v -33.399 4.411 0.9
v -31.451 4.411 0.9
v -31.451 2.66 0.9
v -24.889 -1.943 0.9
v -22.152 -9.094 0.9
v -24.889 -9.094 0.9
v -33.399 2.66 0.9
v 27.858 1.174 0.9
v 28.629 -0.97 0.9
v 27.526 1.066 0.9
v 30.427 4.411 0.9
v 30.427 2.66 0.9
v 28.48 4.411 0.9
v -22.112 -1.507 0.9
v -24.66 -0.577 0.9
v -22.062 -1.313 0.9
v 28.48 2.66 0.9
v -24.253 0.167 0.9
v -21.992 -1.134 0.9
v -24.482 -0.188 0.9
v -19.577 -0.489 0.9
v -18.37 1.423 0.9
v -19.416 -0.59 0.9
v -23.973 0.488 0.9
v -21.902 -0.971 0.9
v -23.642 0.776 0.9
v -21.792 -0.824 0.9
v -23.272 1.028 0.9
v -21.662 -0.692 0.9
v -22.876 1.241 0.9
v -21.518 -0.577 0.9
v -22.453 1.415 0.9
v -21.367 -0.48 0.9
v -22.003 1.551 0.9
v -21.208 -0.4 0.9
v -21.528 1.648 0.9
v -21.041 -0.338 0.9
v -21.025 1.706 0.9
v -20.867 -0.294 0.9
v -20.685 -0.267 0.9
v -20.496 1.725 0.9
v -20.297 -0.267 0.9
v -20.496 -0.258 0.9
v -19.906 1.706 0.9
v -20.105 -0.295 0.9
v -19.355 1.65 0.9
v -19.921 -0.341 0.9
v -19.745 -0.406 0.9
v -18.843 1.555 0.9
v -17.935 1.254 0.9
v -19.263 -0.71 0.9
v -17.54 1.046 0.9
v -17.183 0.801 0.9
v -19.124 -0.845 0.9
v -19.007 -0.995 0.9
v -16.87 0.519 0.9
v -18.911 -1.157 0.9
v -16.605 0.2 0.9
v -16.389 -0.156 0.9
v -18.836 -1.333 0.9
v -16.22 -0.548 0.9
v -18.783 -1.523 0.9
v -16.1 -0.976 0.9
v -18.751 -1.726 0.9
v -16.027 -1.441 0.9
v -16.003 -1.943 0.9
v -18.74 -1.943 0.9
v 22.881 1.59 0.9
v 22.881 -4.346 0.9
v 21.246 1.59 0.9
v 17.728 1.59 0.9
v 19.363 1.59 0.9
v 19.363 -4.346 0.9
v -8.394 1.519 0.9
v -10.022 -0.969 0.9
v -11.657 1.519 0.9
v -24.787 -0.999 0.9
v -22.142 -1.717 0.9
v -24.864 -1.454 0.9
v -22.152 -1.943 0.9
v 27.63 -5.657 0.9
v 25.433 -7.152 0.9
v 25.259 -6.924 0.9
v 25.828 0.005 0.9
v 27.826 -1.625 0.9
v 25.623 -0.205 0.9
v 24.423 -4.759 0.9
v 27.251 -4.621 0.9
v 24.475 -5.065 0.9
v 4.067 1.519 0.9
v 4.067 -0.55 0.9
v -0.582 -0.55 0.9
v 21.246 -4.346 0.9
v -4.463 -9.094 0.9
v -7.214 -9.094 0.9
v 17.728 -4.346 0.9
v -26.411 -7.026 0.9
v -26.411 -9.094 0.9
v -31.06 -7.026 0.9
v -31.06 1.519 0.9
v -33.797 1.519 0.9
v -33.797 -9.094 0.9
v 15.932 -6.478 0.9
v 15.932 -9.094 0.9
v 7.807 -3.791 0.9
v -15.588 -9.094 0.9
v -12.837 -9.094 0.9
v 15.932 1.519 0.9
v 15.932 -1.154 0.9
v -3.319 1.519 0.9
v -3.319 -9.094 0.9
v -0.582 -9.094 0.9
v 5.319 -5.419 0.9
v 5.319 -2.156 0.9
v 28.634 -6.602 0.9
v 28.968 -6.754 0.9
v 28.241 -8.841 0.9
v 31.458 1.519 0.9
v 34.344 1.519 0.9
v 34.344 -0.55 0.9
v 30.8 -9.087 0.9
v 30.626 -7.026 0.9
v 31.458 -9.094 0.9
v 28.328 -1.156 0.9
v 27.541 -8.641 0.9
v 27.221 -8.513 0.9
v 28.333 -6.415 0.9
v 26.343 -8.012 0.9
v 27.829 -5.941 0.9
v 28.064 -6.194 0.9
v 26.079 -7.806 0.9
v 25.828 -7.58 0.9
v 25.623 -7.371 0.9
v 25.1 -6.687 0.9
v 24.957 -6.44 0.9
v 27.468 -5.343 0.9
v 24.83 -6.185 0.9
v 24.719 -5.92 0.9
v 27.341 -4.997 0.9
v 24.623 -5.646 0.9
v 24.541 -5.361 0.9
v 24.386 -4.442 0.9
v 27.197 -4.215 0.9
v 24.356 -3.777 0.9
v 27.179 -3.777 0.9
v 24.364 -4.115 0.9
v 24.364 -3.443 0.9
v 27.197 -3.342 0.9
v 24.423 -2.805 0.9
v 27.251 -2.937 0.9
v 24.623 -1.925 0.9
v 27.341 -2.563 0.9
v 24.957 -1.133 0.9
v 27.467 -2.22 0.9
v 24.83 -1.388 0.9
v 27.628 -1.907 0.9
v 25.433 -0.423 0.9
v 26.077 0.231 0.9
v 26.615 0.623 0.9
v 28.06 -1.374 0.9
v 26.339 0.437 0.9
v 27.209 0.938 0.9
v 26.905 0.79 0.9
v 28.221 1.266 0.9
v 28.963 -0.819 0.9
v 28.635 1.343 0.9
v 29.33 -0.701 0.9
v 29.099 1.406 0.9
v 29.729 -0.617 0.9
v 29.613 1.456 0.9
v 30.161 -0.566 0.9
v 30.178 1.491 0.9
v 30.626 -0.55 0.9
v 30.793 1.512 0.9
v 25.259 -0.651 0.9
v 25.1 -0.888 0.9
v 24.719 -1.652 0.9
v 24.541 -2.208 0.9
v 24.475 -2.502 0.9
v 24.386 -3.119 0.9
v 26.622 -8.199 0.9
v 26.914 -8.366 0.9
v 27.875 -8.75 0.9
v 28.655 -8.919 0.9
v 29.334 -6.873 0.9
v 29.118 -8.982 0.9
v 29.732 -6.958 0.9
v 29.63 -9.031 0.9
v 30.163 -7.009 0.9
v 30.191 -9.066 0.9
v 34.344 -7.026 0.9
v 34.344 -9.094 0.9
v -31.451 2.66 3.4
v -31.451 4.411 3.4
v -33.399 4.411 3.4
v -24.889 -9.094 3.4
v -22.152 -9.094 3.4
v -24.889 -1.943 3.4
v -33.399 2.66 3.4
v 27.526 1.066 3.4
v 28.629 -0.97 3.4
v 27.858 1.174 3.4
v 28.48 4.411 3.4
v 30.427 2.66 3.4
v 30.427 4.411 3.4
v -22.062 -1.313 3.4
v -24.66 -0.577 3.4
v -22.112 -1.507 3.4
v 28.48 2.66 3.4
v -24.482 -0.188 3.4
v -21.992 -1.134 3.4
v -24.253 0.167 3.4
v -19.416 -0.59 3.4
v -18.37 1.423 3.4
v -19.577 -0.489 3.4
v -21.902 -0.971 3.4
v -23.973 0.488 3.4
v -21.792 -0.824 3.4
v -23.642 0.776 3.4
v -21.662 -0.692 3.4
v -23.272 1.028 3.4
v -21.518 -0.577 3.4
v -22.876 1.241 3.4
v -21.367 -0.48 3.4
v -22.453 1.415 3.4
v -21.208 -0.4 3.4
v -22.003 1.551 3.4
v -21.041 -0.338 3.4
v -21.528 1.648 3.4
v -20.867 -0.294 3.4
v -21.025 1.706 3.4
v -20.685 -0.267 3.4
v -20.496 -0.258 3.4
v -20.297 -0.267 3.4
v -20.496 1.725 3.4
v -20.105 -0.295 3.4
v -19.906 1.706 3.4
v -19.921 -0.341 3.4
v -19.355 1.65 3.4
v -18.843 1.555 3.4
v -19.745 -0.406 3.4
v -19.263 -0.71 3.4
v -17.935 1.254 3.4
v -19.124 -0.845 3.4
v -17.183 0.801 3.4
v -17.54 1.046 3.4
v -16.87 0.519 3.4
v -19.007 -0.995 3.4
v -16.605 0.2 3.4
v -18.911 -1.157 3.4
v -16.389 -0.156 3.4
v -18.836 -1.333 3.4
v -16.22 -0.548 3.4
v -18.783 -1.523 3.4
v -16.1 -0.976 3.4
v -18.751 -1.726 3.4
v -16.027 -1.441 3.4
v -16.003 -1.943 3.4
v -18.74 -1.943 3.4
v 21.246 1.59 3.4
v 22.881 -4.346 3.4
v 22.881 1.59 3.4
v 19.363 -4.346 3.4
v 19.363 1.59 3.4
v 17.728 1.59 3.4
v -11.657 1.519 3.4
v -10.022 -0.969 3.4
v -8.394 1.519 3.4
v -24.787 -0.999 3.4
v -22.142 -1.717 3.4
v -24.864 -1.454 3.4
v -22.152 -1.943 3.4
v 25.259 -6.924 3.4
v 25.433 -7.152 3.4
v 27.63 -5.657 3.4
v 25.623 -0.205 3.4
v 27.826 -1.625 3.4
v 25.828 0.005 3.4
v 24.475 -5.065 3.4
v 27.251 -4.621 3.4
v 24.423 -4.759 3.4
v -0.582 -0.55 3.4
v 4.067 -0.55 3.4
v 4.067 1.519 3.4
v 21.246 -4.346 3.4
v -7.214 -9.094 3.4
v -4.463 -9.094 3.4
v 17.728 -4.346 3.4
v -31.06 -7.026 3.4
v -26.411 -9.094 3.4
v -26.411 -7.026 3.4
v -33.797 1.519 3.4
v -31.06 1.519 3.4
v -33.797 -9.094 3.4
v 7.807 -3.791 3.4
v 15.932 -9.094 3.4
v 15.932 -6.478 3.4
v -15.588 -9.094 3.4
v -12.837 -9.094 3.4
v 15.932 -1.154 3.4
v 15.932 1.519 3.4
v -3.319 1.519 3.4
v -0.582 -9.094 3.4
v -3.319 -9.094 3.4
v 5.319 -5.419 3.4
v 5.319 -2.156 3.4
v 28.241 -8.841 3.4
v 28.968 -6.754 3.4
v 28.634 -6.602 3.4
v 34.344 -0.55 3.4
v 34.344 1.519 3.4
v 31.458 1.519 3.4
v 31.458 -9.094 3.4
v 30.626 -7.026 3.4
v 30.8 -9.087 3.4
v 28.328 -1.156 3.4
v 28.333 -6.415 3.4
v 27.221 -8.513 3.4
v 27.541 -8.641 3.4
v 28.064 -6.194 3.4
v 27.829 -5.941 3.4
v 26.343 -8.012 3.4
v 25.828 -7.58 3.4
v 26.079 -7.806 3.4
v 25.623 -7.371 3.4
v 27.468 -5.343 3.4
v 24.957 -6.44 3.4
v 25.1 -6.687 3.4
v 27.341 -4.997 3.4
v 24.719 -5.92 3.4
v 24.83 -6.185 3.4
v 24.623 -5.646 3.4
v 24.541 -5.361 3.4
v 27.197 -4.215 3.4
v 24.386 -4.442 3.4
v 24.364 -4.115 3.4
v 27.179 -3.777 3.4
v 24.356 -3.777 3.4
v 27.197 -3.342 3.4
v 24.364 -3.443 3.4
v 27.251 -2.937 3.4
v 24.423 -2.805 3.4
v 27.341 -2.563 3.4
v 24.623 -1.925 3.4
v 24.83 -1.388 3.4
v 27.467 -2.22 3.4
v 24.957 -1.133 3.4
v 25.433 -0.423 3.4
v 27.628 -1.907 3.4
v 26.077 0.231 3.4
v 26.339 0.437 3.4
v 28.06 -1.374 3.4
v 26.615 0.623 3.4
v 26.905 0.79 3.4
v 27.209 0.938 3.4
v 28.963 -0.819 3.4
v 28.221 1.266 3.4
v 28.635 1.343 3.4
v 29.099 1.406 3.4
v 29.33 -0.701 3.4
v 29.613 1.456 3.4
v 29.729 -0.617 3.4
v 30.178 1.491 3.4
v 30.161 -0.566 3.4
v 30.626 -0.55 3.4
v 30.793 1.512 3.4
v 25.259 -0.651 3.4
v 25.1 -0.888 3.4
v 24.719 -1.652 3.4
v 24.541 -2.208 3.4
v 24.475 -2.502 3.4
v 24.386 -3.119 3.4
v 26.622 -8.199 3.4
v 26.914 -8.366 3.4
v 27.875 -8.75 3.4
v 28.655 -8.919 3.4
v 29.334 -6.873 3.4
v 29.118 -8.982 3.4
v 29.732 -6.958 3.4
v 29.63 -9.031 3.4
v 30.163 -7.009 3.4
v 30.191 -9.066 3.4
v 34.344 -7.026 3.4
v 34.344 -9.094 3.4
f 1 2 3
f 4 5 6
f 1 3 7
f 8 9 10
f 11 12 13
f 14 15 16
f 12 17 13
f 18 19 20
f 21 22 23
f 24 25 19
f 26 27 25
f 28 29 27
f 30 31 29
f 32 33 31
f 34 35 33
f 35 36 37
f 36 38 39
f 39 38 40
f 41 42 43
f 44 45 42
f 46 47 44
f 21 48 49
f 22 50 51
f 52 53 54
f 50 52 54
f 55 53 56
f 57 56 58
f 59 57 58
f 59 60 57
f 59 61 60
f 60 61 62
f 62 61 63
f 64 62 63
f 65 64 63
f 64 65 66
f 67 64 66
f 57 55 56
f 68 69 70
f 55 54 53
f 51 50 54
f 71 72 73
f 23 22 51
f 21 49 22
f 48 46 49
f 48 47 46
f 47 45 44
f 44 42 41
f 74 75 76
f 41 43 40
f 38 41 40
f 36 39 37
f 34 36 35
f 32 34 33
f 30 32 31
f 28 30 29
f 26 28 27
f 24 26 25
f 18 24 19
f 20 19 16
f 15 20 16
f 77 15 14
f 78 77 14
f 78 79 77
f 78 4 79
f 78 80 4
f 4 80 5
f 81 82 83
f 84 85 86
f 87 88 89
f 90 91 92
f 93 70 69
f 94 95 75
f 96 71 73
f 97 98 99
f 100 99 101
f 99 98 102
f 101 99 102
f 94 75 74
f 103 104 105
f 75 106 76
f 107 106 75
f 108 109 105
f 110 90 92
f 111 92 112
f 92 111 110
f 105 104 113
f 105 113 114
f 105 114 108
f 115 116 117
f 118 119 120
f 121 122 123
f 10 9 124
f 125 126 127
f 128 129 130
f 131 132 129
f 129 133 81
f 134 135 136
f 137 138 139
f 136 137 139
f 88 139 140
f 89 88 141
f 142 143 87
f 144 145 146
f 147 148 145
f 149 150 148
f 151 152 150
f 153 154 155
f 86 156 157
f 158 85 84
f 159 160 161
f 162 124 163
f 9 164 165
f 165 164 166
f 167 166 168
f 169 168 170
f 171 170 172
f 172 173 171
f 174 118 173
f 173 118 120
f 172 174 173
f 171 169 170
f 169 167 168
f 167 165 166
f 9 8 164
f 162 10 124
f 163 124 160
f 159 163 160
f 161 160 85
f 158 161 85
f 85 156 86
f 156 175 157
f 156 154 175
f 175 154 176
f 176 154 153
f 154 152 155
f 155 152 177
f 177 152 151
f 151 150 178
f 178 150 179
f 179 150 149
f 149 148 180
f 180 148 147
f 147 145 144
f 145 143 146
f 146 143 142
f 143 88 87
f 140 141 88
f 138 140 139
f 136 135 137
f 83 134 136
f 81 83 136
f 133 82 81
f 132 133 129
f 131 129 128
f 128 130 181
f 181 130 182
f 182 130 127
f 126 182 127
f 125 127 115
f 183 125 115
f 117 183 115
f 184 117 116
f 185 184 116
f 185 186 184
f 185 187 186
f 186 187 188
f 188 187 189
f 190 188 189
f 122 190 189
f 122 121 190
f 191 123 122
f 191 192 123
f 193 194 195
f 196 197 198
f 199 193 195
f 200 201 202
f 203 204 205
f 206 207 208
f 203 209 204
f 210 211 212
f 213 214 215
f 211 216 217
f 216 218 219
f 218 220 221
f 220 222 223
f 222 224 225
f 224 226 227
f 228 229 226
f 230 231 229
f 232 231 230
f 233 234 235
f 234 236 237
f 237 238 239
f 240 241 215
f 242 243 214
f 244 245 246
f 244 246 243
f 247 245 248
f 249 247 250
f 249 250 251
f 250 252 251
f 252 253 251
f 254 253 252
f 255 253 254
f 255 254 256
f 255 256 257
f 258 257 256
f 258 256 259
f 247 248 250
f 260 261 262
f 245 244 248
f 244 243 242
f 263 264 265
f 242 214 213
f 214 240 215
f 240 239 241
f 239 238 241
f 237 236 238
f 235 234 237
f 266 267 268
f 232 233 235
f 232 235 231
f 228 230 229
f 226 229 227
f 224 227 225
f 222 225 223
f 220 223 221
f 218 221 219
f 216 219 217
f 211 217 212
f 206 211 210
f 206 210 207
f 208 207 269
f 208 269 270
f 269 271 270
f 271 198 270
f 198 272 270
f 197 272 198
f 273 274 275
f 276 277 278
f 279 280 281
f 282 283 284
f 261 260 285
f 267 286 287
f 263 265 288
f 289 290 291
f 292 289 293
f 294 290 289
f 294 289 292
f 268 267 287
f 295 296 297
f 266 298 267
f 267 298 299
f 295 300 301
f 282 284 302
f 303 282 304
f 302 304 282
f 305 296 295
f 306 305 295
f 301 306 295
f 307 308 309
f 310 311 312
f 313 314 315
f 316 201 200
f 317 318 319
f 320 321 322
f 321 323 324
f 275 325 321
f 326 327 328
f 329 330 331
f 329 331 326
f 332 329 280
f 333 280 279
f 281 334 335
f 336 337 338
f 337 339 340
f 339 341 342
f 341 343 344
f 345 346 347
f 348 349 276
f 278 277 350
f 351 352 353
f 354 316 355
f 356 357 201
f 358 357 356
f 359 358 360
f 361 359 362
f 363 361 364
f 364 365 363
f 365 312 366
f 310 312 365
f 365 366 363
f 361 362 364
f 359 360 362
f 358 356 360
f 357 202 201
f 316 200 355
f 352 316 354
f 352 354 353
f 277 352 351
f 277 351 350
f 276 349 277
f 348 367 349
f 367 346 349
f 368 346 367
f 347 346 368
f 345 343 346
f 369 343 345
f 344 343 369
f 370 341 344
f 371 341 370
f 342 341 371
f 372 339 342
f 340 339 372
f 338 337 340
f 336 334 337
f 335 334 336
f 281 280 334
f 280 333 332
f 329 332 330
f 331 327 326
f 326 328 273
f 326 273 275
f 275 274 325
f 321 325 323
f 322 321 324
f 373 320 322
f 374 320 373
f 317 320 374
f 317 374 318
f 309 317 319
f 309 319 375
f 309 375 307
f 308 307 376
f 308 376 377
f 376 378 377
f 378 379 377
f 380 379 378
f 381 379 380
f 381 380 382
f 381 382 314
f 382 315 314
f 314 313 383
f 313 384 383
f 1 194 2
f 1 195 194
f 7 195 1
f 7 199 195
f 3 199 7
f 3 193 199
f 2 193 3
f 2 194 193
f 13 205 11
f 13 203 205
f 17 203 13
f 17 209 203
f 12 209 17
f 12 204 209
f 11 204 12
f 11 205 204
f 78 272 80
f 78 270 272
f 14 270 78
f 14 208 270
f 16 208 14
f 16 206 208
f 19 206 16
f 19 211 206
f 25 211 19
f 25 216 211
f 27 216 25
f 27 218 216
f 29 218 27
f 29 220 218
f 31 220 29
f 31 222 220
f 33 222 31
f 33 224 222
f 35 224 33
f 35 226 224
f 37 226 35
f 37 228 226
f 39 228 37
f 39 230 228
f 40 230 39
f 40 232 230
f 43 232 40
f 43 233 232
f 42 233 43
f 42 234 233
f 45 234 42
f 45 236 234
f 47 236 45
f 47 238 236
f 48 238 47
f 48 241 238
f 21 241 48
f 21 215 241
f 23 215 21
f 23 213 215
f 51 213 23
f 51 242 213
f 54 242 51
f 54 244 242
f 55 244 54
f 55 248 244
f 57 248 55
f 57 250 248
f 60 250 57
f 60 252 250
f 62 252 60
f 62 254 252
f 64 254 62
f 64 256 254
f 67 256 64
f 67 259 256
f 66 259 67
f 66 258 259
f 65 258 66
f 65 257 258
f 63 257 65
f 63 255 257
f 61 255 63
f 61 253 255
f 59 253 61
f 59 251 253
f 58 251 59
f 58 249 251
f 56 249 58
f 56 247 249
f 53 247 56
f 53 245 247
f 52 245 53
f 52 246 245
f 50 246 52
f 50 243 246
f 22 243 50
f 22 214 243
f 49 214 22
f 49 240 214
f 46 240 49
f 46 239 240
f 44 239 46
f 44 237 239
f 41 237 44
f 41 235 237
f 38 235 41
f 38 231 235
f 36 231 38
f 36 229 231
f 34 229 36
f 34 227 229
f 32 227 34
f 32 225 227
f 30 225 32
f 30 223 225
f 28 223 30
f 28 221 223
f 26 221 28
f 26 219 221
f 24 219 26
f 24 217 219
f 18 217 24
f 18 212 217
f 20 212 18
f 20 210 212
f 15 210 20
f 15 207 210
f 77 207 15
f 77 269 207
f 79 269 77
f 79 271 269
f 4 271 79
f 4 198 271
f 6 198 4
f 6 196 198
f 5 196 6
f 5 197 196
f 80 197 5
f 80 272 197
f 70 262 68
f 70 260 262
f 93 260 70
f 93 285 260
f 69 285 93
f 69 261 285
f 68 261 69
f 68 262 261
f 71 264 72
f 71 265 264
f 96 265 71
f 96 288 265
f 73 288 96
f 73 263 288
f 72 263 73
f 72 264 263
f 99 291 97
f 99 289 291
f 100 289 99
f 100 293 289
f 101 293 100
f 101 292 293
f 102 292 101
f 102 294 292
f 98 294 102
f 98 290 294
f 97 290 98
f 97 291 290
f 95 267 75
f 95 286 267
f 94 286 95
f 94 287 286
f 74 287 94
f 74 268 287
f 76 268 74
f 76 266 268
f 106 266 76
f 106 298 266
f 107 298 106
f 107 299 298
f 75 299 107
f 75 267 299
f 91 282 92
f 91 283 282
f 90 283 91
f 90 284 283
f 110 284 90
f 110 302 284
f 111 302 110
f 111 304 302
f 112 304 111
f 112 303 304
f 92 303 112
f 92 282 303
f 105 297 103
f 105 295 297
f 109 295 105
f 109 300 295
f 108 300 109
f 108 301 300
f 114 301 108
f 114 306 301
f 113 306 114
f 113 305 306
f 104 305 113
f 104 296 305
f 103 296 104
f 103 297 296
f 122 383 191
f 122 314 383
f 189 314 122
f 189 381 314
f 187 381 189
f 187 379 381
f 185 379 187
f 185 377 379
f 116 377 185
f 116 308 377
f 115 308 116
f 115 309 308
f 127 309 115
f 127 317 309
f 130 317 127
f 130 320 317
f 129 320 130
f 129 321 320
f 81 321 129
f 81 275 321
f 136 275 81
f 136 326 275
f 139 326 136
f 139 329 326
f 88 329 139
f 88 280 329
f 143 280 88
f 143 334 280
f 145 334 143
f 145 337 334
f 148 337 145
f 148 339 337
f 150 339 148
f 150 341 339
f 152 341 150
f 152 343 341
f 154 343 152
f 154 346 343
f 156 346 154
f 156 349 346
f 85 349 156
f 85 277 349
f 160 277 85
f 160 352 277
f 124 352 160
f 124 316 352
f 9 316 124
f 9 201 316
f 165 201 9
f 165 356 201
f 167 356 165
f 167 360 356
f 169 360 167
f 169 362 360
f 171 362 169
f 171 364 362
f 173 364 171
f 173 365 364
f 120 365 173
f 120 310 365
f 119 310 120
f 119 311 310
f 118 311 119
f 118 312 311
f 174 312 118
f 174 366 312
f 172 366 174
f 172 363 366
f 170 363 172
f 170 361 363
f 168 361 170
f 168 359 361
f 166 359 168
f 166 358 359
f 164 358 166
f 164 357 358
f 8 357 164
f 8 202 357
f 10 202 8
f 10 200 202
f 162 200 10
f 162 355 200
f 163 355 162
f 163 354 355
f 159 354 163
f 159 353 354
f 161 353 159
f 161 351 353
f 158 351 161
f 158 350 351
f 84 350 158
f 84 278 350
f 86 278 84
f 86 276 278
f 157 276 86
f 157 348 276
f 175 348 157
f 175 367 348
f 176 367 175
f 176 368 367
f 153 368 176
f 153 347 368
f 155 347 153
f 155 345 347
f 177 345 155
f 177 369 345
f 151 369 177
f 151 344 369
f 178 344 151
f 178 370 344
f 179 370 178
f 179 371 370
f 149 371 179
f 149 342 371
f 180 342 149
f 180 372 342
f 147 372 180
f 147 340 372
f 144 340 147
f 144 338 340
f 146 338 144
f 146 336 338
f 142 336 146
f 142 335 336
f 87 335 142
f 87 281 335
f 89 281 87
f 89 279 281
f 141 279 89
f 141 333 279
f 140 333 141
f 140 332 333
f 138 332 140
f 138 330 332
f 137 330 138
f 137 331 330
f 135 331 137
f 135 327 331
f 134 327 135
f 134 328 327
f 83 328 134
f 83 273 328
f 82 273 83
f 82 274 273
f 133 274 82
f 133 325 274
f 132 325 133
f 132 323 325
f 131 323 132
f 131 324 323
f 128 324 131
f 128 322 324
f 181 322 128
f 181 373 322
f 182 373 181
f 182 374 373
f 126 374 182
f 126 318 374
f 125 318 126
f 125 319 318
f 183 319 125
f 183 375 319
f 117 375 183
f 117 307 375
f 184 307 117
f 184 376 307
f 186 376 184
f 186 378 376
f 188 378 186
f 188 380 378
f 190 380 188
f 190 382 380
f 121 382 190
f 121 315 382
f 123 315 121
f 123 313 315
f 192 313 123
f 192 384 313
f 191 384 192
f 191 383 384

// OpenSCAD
$fn = 48;
  // syllabics (overlaid on icon, tallest)
  translate([0, -2.500, 0.900]) linear_extrude(height=2.500) text("ᒫᒋᐱᒥᐸᐦᑖ", size=10.483, halign="center", valign="center", font="Euphemia UCAS:style=Bold");
